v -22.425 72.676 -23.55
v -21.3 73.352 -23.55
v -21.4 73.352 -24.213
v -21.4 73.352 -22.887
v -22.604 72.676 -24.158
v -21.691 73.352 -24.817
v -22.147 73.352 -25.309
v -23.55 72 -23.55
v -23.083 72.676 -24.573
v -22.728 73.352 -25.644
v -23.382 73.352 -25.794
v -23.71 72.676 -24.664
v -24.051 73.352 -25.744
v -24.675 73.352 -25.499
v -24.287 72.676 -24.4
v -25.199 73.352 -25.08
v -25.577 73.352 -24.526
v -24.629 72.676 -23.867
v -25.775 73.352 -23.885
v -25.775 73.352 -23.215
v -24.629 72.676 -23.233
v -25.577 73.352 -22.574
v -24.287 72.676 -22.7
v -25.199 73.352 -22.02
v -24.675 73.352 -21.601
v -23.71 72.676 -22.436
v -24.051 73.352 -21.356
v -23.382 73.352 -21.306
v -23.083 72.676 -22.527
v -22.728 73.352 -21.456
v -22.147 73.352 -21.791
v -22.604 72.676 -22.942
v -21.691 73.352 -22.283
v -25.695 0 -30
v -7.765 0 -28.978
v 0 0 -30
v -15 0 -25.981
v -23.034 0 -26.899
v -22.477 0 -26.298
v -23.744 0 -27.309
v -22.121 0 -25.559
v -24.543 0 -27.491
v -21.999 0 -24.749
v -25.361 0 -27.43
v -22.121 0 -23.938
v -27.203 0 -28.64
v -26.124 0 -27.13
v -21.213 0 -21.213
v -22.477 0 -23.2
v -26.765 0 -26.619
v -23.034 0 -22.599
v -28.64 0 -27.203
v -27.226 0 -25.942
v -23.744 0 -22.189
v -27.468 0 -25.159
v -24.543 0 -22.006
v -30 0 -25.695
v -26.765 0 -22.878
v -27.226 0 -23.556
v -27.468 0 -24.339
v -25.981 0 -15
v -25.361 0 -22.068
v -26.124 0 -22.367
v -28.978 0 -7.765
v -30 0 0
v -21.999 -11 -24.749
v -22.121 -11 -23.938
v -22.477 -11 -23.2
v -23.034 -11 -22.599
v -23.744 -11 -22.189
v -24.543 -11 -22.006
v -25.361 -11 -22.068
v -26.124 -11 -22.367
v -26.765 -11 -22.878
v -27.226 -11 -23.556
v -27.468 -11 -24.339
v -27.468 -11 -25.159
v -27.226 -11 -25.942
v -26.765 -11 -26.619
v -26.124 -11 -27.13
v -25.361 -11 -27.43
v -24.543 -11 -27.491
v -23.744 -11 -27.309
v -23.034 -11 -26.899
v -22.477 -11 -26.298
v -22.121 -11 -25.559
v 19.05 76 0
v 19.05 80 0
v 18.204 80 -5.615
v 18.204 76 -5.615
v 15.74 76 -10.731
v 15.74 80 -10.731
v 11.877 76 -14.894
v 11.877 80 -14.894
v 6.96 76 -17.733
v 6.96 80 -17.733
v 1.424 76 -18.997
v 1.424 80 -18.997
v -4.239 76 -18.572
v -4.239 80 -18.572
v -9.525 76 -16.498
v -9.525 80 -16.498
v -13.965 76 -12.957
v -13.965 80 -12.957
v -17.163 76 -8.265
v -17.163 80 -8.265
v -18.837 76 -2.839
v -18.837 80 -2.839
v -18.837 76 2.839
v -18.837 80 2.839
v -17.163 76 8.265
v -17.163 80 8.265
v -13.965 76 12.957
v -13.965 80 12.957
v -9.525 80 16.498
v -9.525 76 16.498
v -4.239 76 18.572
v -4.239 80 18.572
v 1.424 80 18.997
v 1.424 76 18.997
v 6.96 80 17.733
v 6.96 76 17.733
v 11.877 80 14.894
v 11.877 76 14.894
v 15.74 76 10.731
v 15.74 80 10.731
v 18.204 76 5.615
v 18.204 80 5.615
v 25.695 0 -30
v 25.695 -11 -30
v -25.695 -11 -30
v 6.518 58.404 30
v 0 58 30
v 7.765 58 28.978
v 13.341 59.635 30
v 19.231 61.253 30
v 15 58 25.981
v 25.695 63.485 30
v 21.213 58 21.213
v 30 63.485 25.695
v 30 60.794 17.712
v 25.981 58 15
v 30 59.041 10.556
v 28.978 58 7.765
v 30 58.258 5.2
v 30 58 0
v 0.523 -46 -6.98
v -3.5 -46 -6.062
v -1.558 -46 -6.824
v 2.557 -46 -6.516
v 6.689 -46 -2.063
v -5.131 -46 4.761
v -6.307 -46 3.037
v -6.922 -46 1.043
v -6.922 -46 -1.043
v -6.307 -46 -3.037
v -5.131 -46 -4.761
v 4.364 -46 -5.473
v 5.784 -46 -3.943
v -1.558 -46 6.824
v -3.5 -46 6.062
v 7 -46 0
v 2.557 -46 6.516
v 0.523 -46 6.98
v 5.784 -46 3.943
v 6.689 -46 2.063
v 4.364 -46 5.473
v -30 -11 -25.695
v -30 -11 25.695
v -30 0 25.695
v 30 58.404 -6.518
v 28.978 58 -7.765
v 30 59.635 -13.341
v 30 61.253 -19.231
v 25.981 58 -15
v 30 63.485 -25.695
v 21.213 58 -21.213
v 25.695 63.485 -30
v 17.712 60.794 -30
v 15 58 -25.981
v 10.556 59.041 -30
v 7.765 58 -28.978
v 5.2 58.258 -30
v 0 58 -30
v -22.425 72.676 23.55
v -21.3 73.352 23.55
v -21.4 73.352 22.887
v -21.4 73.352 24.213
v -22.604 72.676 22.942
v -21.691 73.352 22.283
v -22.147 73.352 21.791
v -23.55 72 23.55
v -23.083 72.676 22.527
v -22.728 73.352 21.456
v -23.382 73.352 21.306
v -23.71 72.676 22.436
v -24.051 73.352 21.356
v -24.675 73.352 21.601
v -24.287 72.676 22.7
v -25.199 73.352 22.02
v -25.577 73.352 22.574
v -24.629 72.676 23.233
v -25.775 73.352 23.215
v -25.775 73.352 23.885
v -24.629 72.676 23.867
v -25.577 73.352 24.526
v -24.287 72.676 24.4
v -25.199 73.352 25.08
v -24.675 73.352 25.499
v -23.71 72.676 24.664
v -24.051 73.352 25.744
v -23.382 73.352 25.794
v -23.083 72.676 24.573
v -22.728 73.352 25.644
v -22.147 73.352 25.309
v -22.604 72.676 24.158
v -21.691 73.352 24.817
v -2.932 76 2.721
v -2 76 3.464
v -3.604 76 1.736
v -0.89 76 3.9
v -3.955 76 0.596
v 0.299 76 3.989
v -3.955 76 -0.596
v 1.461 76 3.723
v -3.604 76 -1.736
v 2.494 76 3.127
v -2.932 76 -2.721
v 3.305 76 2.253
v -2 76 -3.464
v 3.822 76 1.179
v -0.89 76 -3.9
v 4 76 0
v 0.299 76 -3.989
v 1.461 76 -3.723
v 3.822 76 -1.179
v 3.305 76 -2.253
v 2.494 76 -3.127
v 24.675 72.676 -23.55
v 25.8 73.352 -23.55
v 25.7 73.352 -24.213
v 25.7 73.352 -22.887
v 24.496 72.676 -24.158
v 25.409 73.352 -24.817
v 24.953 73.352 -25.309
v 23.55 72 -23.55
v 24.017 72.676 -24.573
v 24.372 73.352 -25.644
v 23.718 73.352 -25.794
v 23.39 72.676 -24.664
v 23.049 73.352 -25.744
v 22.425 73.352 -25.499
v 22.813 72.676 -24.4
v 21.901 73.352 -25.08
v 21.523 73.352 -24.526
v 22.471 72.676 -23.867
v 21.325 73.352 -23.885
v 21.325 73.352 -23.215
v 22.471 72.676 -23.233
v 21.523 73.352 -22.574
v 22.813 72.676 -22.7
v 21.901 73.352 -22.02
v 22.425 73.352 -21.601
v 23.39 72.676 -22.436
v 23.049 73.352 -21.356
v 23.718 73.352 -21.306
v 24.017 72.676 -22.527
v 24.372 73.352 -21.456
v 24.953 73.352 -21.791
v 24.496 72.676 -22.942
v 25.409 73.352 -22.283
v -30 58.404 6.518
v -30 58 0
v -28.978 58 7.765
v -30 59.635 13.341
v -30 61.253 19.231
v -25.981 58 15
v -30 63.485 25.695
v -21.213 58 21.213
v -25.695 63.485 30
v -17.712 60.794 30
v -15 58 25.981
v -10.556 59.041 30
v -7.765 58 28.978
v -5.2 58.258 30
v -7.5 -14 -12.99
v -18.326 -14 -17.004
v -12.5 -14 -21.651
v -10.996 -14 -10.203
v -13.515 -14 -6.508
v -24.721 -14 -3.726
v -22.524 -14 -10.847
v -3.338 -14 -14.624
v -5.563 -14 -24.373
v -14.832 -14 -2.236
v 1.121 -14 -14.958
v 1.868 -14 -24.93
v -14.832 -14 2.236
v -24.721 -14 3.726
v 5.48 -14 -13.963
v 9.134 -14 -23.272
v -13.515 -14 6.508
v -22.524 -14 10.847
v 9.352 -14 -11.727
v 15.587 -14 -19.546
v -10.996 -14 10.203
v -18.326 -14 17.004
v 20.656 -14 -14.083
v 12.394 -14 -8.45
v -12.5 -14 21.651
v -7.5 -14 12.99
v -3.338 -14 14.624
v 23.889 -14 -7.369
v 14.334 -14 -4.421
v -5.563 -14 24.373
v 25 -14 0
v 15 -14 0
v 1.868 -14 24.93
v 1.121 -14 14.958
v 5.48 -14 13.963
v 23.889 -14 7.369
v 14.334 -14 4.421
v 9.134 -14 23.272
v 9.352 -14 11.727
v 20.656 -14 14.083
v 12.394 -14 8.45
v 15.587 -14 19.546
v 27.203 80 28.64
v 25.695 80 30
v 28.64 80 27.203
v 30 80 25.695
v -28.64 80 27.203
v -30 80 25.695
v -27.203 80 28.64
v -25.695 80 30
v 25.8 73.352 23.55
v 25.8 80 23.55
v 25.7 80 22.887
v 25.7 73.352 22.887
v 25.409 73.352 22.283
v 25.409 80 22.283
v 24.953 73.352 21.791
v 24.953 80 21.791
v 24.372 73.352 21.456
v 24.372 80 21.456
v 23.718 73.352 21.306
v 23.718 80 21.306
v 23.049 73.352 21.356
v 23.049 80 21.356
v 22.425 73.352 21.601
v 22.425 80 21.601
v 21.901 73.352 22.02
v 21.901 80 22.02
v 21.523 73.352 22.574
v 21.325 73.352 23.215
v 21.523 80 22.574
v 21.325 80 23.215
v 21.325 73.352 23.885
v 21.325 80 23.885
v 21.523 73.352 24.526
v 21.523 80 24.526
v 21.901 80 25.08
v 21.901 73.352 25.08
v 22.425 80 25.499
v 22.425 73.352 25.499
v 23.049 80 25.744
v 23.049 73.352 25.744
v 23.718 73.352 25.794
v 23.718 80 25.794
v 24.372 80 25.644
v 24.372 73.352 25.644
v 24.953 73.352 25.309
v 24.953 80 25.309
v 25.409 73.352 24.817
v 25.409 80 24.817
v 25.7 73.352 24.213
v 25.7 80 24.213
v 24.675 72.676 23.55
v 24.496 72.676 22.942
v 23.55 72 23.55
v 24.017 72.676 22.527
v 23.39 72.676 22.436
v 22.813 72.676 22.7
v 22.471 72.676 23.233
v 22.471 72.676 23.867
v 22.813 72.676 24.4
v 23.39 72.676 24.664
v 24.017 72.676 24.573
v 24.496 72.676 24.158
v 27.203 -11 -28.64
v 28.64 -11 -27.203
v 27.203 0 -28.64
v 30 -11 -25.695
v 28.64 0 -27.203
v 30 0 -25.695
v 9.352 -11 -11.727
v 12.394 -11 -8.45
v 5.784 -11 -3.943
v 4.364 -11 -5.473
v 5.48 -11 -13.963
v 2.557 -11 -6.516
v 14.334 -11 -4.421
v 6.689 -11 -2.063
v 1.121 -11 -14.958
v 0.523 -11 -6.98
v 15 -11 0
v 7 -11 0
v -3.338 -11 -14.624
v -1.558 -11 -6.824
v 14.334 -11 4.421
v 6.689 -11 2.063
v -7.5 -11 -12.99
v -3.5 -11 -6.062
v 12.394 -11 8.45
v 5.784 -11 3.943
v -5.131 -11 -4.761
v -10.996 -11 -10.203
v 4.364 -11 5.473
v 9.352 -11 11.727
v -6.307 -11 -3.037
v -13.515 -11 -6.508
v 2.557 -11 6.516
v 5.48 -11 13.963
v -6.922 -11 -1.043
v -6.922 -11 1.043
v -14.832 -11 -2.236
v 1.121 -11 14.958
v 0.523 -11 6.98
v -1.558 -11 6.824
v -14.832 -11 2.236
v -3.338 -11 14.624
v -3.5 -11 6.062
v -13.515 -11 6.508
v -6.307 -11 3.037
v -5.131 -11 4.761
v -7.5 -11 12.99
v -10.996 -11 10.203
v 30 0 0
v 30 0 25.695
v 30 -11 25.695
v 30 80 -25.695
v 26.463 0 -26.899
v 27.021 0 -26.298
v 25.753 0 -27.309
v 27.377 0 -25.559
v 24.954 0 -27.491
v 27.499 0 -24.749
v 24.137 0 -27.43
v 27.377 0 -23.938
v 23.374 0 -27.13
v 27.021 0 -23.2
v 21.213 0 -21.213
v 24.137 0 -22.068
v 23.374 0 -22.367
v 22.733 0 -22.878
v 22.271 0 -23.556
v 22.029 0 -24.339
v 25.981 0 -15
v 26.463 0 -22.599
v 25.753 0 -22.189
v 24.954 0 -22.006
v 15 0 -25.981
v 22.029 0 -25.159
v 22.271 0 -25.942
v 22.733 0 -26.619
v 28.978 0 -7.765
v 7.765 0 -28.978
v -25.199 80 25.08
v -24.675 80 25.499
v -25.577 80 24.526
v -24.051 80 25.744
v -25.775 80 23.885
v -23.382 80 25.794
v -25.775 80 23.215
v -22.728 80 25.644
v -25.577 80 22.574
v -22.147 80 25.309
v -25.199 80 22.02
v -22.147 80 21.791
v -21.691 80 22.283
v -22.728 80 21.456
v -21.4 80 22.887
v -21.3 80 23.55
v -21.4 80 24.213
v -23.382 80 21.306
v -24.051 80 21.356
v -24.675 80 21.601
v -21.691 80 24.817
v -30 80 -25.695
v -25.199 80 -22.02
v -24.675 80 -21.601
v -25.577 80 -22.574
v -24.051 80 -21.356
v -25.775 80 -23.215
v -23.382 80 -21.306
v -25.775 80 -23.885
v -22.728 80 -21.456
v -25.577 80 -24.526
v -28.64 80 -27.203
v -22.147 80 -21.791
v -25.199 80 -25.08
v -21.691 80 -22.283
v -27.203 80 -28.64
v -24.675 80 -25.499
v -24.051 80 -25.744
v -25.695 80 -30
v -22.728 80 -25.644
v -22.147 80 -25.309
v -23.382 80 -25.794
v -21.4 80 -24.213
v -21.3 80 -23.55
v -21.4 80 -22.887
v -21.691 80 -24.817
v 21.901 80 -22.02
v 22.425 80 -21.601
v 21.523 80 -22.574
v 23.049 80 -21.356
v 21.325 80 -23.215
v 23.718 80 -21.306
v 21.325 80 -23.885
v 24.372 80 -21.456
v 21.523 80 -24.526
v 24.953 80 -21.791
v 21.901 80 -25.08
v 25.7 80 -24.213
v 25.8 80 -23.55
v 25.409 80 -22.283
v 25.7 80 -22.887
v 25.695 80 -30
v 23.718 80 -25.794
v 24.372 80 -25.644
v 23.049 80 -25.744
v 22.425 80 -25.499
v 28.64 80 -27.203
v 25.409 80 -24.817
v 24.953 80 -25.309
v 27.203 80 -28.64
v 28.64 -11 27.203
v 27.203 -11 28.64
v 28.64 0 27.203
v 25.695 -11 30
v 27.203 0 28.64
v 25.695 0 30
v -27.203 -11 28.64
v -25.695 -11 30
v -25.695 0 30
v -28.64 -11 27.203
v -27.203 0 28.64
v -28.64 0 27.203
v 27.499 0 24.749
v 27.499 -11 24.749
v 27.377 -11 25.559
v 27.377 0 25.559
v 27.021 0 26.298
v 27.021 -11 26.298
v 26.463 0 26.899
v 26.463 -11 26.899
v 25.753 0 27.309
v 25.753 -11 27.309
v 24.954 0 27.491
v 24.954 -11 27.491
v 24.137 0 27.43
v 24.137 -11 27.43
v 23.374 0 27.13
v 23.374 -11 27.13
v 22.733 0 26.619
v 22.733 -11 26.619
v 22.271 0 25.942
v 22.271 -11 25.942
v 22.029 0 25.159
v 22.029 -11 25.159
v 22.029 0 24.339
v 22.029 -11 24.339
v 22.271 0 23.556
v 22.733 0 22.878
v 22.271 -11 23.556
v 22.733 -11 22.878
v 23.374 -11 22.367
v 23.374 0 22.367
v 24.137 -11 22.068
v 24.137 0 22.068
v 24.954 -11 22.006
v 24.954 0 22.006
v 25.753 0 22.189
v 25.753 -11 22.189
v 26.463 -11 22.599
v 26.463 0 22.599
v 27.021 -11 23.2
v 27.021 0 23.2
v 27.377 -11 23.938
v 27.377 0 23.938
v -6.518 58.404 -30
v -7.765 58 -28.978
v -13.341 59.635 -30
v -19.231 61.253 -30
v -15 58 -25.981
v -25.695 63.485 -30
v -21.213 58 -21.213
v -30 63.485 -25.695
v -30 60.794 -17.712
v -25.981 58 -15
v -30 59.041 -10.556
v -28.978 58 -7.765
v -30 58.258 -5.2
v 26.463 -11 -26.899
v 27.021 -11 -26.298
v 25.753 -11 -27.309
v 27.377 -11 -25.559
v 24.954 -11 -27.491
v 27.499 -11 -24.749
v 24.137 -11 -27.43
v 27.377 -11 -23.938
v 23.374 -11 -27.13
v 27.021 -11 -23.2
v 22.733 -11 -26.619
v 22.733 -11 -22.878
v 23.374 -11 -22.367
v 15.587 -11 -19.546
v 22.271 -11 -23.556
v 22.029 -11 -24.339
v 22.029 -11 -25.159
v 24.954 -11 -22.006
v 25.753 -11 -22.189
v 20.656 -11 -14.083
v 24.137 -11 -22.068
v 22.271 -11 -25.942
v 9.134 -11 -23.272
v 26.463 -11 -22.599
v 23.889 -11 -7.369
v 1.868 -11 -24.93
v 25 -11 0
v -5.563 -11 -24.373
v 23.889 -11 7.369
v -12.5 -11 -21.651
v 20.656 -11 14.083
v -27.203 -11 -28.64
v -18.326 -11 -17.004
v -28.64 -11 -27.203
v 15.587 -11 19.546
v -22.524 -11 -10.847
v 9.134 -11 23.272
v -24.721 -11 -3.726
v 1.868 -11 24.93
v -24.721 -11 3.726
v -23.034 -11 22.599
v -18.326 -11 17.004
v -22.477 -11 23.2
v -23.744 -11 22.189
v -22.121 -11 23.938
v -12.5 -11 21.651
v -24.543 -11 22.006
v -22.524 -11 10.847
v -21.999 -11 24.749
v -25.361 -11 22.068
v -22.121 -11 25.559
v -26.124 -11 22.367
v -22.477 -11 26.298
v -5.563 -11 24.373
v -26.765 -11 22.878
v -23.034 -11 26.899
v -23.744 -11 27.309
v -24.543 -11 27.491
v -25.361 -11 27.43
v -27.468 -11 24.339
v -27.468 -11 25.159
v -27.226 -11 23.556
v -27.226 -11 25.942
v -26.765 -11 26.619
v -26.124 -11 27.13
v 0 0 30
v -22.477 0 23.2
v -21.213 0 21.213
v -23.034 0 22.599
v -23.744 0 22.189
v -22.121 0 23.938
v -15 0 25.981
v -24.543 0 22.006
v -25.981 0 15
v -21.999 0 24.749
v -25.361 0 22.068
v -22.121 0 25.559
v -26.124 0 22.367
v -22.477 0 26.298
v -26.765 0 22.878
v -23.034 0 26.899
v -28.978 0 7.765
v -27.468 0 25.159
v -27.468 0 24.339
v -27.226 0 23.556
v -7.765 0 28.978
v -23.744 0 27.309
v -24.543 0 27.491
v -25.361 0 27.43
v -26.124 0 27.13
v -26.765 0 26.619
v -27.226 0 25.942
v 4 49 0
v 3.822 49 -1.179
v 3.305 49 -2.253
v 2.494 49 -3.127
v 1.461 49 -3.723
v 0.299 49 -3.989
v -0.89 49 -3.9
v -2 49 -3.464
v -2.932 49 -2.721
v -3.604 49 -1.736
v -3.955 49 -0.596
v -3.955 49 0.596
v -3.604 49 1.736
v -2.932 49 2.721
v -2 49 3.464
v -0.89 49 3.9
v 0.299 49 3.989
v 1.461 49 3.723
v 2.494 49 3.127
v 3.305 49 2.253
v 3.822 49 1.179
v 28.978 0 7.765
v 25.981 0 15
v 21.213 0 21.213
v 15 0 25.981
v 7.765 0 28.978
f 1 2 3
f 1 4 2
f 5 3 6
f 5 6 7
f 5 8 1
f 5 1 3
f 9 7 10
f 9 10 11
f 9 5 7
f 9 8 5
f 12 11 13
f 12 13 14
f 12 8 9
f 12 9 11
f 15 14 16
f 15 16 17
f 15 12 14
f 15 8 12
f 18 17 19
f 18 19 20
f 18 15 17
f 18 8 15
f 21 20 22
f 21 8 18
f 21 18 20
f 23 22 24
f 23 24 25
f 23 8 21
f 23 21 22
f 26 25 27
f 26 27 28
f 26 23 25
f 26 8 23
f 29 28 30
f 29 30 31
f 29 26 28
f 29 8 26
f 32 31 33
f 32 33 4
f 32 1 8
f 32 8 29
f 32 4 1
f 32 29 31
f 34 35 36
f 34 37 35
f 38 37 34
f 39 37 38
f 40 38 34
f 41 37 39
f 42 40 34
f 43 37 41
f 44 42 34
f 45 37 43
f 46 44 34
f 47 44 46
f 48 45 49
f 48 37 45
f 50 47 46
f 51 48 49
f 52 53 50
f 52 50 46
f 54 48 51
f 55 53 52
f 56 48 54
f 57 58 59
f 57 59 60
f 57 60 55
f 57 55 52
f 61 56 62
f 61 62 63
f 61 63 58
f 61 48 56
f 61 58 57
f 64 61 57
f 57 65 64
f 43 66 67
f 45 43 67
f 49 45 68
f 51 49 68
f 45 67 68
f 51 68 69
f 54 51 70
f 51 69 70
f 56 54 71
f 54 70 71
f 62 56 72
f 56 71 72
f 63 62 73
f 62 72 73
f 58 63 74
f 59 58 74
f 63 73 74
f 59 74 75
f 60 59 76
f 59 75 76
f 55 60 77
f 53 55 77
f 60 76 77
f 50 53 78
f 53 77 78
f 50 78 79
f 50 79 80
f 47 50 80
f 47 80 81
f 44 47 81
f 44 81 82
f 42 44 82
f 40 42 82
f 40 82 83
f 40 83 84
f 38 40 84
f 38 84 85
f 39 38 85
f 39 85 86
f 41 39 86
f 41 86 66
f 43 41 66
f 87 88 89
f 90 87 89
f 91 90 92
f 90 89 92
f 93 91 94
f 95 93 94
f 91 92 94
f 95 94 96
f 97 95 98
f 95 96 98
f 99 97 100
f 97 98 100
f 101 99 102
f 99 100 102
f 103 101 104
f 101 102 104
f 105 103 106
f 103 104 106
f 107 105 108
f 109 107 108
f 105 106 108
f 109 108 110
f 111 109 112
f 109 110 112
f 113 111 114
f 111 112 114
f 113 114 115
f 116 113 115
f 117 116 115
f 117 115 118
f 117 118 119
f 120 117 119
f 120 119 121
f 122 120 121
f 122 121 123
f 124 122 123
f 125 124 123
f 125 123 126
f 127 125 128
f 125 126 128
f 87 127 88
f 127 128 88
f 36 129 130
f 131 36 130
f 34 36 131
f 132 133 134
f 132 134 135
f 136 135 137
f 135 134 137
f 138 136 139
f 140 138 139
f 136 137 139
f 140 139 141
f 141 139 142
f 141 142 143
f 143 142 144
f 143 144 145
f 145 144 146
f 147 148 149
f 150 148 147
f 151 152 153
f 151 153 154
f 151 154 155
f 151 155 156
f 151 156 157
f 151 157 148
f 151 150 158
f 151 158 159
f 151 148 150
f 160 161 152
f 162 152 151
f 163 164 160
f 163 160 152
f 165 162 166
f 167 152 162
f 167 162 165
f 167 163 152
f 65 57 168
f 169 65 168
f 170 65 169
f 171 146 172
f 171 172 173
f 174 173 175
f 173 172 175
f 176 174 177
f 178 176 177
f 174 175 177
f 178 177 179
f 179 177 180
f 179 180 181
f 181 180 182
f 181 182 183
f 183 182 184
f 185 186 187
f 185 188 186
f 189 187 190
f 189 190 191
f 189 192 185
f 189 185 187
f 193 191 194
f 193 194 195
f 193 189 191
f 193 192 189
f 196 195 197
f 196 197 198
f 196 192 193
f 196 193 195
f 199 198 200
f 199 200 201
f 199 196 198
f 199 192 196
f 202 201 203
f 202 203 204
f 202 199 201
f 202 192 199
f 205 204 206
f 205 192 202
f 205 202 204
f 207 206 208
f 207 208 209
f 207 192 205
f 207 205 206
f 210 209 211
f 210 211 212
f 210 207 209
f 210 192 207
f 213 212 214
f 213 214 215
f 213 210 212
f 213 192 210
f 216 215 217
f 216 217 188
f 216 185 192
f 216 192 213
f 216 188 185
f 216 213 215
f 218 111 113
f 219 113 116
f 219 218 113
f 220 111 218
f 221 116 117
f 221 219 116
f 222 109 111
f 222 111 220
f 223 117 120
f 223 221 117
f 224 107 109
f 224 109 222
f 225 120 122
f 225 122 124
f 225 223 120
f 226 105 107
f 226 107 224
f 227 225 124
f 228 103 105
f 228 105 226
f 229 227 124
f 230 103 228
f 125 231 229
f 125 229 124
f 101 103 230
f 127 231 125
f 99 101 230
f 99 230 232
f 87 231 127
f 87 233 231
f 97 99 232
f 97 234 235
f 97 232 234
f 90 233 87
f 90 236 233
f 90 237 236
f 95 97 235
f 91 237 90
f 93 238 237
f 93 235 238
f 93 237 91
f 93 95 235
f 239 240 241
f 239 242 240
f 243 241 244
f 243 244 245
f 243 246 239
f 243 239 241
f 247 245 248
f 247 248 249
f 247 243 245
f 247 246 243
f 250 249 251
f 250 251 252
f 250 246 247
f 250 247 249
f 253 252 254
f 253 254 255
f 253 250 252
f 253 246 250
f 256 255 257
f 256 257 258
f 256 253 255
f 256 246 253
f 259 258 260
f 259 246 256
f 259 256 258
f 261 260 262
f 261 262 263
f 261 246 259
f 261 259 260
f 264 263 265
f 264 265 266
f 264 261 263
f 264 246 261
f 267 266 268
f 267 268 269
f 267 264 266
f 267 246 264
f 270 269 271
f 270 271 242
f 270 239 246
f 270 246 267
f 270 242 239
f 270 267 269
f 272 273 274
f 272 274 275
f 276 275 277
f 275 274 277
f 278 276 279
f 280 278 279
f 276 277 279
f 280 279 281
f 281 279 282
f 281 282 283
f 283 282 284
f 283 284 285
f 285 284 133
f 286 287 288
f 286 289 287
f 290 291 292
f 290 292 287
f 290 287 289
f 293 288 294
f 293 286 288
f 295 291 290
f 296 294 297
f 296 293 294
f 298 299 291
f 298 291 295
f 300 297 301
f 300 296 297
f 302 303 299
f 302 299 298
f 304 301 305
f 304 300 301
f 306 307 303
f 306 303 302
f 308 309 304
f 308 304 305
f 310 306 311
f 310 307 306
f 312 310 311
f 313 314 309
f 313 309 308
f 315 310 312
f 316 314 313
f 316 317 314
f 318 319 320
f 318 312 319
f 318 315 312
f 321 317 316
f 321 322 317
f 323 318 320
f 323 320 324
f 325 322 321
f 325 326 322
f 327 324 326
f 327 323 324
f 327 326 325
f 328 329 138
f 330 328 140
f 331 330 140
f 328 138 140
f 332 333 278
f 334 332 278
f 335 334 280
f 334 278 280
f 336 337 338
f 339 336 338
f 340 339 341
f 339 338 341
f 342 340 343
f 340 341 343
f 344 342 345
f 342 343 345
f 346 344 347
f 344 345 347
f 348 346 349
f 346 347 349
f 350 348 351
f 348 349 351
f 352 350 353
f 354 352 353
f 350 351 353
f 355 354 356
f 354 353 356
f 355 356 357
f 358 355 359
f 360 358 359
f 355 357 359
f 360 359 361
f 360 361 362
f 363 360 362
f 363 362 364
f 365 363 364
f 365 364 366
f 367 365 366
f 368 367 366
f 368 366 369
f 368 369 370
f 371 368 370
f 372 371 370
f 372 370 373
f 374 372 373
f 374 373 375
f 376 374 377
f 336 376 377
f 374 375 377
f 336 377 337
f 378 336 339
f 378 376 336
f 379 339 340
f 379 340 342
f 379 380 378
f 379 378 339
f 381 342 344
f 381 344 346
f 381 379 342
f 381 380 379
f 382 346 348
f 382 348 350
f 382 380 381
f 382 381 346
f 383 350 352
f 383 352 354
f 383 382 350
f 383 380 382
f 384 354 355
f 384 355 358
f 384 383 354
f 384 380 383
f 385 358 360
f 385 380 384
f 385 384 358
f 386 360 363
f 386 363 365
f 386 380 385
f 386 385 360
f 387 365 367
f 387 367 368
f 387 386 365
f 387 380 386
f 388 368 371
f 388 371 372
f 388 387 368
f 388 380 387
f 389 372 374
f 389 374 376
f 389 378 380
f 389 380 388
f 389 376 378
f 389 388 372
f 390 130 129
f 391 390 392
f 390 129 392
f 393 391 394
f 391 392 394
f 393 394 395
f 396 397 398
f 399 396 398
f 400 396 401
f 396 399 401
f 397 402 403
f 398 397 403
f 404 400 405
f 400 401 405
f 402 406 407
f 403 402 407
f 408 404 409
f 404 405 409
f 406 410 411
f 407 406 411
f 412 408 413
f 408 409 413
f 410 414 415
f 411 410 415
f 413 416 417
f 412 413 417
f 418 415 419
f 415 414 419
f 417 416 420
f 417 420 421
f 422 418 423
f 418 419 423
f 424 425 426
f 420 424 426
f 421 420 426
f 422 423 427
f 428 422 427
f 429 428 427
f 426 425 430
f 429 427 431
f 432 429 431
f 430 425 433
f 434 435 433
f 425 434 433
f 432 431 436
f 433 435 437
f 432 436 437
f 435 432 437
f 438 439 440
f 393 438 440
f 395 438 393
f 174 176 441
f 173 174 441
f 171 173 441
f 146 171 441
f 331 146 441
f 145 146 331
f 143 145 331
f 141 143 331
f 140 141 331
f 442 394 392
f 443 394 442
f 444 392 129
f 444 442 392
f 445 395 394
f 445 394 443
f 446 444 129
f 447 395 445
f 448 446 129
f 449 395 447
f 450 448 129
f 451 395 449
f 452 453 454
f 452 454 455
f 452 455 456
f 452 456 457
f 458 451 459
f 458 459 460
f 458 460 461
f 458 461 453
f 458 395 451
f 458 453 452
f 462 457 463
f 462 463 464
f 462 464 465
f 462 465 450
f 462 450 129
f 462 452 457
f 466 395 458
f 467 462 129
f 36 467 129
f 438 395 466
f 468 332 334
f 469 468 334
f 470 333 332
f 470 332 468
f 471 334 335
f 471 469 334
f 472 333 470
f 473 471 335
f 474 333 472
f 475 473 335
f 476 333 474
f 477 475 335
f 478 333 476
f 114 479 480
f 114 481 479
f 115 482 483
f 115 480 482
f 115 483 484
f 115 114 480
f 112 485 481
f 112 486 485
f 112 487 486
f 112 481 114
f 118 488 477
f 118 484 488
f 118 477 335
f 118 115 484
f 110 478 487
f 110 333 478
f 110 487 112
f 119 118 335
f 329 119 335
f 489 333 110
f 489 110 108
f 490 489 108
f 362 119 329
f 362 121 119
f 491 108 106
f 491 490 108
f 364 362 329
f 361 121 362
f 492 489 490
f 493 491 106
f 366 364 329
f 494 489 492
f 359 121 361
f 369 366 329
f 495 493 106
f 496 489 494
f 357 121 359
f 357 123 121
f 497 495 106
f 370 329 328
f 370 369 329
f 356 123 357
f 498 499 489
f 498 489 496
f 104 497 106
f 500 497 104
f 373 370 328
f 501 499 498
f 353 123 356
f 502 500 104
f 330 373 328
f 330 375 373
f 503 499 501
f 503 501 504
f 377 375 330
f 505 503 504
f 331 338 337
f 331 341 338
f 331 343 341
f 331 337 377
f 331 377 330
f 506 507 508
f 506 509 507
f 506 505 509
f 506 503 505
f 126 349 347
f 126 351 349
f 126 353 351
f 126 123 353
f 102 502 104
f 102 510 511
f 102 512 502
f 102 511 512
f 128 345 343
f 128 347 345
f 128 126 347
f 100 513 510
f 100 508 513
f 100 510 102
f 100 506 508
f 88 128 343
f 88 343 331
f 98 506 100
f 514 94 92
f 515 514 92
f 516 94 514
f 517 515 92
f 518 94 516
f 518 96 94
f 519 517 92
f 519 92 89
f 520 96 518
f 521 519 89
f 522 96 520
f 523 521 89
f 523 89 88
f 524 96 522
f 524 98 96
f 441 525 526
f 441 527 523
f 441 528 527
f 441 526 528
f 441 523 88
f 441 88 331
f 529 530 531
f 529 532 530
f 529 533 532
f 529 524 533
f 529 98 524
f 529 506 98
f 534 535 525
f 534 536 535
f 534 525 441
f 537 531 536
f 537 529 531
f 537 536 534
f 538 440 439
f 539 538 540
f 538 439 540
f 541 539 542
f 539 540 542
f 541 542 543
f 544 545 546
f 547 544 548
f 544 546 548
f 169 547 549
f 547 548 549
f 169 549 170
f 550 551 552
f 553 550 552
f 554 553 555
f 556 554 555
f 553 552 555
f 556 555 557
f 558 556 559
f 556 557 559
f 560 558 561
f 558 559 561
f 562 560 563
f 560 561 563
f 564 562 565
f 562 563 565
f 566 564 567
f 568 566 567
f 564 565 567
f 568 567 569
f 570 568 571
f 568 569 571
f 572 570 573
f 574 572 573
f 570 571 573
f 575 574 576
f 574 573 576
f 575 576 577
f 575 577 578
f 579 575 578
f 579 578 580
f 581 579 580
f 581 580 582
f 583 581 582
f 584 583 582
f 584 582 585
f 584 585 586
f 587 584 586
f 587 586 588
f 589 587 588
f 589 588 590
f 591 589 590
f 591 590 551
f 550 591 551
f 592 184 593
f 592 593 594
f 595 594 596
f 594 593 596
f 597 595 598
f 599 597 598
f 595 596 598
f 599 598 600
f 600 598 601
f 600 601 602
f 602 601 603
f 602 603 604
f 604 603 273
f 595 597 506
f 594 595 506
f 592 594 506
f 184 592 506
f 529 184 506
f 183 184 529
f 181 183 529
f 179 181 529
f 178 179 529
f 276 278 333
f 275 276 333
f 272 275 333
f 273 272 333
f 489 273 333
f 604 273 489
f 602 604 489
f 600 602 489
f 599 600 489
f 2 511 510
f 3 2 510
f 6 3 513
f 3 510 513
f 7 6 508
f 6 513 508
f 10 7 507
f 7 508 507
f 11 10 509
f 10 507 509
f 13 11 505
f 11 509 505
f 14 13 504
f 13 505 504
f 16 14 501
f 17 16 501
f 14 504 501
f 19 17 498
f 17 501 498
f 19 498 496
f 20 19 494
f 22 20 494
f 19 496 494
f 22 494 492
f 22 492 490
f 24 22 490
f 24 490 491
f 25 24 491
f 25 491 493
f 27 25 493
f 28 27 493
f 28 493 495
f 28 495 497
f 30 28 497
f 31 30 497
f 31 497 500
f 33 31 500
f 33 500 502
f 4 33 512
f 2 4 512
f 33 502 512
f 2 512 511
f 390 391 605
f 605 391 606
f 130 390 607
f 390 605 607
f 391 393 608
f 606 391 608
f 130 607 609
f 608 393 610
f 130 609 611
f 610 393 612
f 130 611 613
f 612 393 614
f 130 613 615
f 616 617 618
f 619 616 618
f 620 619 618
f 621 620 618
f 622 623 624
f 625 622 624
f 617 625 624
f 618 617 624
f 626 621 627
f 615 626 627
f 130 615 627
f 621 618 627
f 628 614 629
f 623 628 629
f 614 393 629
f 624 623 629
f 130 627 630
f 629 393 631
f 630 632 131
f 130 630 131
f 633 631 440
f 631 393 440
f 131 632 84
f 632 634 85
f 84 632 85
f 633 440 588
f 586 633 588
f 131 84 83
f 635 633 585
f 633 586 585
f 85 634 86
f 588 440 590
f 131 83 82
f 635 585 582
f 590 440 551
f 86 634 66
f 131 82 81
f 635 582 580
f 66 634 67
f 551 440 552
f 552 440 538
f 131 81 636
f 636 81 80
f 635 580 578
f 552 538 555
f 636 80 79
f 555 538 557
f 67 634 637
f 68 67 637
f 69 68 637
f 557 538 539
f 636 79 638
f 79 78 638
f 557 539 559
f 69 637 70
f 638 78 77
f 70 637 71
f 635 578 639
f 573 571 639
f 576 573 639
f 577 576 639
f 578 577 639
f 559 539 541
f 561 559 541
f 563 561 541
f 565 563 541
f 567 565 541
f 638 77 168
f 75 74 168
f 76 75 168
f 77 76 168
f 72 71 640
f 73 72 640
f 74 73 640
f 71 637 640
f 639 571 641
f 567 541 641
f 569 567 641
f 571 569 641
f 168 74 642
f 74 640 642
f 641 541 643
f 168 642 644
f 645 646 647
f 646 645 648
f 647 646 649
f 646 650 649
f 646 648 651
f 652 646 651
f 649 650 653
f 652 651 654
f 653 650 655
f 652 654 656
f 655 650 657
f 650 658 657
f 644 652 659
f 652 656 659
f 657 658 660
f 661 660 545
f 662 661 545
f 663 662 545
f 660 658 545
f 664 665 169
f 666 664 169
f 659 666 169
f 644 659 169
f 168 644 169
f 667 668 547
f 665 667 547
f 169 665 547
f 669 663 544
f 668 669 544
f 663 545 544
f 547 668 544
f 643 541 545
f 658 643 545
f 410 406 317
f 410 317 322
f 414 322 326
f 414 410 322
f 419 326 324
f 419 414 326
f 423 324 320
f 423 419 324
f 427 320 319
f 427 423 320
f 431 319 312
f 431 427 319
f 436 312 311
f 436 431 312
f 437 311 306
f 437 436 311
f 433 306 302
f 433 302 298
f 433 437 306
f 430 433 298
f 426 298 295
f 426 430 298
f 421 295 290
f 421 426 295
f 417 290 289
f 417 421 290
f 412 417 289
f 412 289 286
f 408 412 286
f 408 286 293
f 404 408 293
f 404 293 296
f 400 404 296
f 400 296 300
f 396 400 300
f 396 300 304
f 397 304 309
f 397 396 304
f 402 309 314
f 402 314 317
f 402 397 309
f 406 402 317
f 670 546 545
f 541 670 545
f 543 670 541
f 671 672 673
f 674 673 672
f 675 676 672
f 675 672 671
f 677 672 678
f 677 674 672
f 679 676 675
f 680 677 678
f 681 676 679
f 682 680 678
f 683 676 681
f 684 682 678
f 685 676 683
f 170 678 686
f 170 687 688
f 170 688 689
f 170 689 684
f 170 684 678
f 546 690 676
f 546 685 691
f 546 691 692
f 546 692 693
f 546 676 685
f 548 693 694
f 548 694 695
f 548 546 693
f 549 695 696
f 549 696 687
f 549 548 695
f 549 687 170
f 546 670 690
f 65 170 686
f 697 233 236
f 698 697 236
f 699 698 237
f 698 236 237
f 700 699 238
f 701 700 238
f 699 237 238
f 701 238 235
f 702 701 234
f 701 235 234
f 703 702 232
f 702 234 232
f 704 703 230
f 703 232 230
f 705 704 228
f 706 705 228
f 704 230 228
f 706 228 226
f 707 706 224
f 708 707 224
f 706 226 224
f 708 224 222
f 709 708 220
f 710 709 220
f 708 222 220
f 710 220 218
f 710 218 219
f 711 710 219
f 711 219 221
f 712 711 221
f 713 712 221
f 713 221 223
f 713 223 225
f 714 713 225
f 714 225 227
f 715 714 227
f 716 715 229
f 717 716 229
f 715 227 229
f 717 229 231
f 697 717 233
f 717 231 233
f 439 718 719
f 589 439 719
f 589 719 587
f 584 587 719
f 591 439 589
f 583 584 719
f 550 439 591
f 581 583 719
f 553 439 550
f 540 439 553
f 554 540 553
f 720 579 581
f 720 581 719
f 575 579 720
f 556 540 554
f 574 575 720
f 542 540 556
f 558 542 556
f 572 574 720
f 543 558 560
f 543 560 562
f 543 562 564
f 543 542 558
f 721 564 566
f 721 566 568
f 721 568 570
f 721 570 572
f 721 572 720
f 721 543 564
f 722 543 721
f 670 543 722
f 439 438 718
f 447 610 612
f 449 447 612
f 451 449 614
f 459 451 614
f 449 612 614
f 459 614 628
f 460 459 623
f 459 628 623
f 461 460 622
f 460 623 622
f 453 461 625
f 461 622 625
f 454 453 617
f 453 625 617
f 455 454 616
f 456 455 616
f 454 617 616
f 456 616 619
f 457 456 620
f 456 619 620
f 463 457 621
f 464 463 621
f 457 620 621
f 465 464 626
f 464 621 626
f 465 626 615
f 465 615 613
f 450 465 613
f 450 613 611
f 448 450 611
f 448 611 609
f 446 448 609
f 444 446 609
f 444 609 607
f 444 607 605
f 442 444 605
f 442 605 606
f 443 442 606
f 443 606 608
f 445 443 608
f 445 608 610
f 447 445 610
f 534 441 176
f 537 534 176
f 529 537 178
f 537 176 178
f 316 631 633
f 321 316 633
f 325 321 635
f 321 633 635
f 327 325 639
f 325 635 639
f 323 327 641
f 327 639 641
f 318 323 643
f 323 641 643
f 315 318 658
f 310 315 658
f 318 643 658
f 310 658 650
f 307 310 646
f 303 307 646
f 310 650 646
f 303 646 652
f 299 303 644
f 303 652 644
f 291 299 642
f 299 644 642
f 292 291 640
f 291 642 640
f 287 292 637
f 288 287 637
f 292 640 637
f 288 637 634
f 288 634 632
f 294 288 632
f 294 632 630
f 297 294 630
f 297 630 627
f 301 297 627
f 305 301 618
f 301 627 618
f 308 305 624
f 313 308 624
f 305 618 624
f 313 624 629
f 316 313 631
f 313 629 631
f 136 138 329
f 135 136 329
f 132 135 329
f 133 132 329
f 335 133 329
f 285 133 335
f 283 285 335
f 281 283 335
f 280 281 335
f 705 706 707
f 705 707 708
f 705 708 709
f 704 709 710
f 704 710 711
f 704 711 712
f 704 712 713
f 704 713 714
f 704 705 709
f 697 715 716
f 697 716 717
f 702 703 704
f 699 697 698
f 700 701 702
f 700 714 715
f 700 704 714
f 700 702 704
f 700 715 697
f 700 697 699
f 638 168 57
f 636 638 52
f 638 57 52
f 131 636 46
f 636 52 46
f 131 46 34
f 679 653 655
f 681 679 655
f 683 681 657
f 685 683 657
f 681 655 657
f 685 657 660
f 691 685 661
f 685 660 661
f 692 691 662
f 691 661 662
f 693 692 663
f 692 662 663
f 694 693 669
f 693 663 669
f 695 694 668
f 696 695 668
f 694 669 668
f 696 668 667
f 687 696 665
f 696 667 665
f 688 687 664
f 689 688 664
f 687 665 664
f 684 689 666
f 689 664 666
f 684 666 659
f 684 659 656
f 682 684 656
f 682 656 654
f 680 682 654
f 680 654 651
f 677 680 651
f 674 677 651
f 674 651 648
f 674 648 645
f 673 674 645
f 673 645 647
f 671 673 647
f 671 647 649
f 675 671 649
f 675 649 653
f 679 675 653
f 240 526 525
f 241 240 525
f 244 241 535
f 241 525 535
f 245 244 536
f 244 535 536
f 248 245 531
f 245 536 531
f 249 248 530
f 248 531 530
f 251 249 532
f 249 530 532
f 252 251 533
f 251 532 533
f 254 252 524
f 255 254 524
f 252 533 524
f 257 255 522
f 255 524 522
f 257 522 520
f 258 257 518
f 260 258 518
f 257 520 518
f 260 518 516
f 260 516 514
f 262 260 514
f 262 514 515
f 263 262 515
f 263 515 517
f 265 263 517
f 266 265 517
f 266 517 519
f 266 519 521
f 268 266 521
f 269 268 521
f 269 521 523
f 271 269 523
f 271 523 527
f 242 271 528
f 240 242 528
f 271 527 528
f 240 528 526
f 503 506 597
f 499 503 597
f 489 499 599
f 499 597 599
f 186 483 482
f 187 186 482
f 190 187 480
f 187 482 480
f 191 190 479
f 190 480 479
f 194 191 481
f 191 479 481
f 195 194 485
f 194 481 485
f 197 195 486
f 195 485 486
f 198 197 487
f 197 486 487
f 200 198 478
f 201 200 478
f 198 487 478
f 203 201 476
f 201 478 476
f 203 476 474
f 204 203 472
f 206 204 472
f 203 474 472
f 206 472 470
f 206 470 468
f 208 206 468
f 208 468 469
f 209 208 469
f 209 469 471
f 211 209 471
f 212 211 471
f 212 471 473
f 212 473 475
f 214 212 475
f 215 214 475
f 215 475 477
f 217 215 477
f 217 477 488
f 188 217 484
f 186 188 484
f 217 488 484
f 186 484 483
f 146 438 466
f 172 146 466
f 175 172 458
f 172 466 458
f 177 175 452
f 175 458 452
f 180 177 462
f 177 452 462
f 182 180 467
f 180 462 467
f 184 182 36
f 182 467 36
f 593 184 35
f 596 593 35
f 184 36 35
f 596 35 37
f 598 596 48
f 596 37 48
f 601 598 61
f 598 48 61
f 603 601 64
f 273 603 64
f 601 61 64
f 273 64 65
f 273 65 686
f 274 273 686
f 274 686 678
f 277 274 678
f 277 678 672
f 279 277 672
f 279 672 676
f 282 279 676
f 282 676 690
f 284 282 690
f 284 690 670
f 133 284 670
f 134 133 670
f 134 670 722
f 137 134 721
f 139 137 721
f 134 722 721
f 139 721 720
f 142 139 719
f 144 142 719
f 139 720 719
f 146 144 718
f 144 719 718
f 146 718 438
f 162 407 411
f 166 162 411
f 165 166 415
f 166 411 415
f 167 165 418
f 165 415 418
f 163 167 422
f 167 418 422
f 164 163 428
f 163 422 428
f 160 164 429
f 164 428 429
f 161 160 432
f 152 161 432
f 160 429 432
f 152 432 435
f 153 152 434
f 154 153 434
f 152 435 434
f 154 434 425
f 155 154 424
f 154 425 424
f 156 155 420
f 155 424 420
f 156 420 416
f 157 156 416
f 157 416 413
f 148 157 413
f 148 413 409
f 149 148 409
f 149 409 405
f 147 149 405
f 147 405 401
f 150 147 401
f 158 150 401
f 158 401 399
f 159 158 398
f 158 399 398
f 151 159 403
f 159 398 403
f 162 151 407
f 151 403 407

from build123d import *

# Parameters (mm, degrees)
PAD_DEPTH       = 11
SKETCH001_R     = 25
SKETCH001_R_2   = 15
PAD001_DEPTH    = 3
SKETCH002_R     = 7
PAD002_DEPTH    = 35
SKETCH003_R     = 30
PAD003_DEPTH    = 58
PAD004_DEPTH    = 22
SKETCH006_R     = 19.05
POCKET_DEPTH    = 4
SKETCH007_R     = 2.25
HOLE_DEPTH      = 6.648064
HOLE_TIPS_R     = 2.25
SKETCH008_R     = 4
POCKET001_DEPTH = 27
SKETCH009_R     = 2.75
HOLE001_DEPTH   = 23.347633
HOLE001_TIPS_R  = 2.75


with BuildPart() as part:
    # Sketch → Pad (new body)
    with BuildSketch(Plane.XZ):
        with BuildLine():
            Line((-25.69533, 30), (25.69533, 30))
            ThreePointArc((30, 25.69533), (27.930718, 27.930718), (25.69533, 30))
            Line((30, 25.69533), (30, -25.69533))
            ThreePointArc((25.69533, -30), (27.930718, -27.930718), (30, -25.69533))
            Line((25.69533, -30), (-25.69533, -30))
            ThreePointArc((-30, -25.69533), (-27.930718, -27.930718), (-25.69533, -30))
            Line((-30, -25.69533), (-30, 25.69533))
            ThreePointArc((-25.69533, 30), (-27.930718, 27.930718), (-30, 25.69533))
        make_face()
    extrude(amount=PAD_DEPTH)

    # Sketch001 (on Face10 of Pad) → Pad001 (join)
    with BuildSketch(Plane.XZ.offset(11)):
        Circle(SKETCH001_R)
        Circle(SKETCH001_R_2, mode=Mode.SUBTRACT)
    extrude(amount=PAD001_DEPTH)

    # Sketch002 (on Face14 of Pad001) → Pad002 (join)
    with BuildSketch(Plane.XZ.offset(11)):
        Circle(SKETCH002_R)
    extrude(amount=PAD002_DEPTH)

    # Sketch003 (on Face4 of Pad002) → Pad003 (join)
    with BuildSketch(Plane(origin=(0, 0, 0), x_dir=(1, 0, 0), z_dir=(0, 1, 0))):
        Circle(SKETCH003_R)
    extrude(amount=PAD003_DEPTH)

    # Sketch004 (on Face16 of Pad003) → Pad004 (join)
    with BuildSketch(Plane(origin=(0, 58, 0), x_dir=(1, 0, 0), z_dir=(0, 1, 0))):
        with BuildLine():
            ThreePointArc((-30, -25.69533), (-27.930718, -27.930718), (-25.69533, -30))
            Line((25.69533, -30), (-25.69533, -30))
            ThreePointArc((25.69533, -30), (27.930718, -27.930718), (30, -25.69533))
            Line((30, 25.69533), (30, -25.69533))
            ThreePointArc((30, 25.69533), (27.930718, 27.930718), (25.69533, 30))
            Line((-25.69533, 30), (25.69533, 30))
            ThreePointArc((-25.69533, 30), (-27.930718, 27.930718), (-30, 25.69533))
            Line((-30, -25.69533), (-30, 25.69533))
        make_face()
    extrude(amount=PAD004_DEPTH)

    # Sketch005 → Groove (revolve, cut)
    with BuildSketch(Plane.YZ):
        Polygon((80, 68.105118), (58, 30), (58, 68.105118), align=None)
    revolve(axis=Axis((0, 0, 0), (0, 1, 0)), mode=Mode.SUBTRACT)

    # Sketch006 (on Face30 of Groove) → Pocket (cut)
    with BuildSketch(Plane(origin=(0, 80, 0), x_dir=(1, 0, 0), z_dir=(0, 1, 0))):
        Circle(SKETCH006_R)
    extrude(amount=-POCKET_DEPTH, mode=Mode.SUBTRACT)

    # Sketch007 (on Face30 of Pocket) → Hole (cut)
    with BuildSketch(Plane(origin=(0, 80, 0), x_dir=(1, 0, 0), z_dir=(0, 1, 0))):
        with Locations((-23.55, -23.55)):
            Circle(SKETCH007_R)
        with Locations((23.55, -23.55)):
            Circle(SKETCH007_R)
        with Locations((-23.55, 23.55)):
            Circle(SKETCH007_R)
        with Locations((23.55, 23.55)):
            Circle(SKETCH007_R)
    extrude(amount=-HOLE_DEPTH, mode=Mode.SUBTRACT)

    # Hole tips → Hole tip 1 section 0
    with BuildSketch(Plane(origin=(0, 73.351936, 0), x_dir=(1, 0, 0), z_dir=(0, 1, 0)), mode=Mode.PRIVATE) as hole_tip_1_s0:
        with Locations((-23.55, -23.55)):
            Circle(HOLE_TIPS_R)
    loft([hole_tip_1_s0.sketch, Vertex(-23.55, 72, 23.55)], mode=Mode.SUBTRACT)

    # Hole tips → Hole tip 2 section 0
    with BuildSketch(Plane(origin=(0, 73.351936, 0), x_dir=(1, 0, 0), z_dir=(0, 1, 0)), mode=Mode.PRIVATE) as hole_tip_2_s0:
        with Locations((23.55, -23.55)):
            Circle(HOLE_TIPS_R)
    loft([hole_tip_2_s0.sketch, Vertex(23.55, 72, 23.55)], mode=Mode.SUBTRACT)

    # Hole tips → Hole tip 3 section 0
    with BuildSketch(Plane(origin=(0, 73.351936, 0), x_dir=(1, 0, 0), z_dir=(0, 1, 0)), mode=Mode.PRIVATE) as hole_tip_3_s0:
        with Locations((-23.55, 23.55)):
            Circle(HOLE_TIPS_R)
    loft([hole_tip_3_s0.sketch, Vertex(-23.55, 72, -23.55)], mode=Mode.SUBTRACT)

    # Hole tips → Hole tip 4 section 0
    with BuildSketch(Plane(origin=(0, 73.351936, 0), x_dir=(1, 0, 0), z_dir=(0, 1, 0)), mode=Mode.PRIVATE) as hole_tip_4_s0:
        with Locations((23.55, 23.55)):
            Circle(HOLE_TIPS_R)
    loft([hole_tip_4_s0.sketch, Vertex(23.55, 72, -23.55)], mode=Mode.SUBTRACT)

    # Sketch008 (on Face41 of Hole) → Pocket001 (cut)
    with BuildSketch(Plane(origin=(0, 76, 0), x_dir=(1, 0, 0), z_dir=(0, 1, 0))):
        Circle(SKETCH008_R)
    extrude(amount=-POCKET001_DEPTH, mode=Mode.SUBTRACT)

    # Sketch009 (on Face6 of Pocket001) → Hole001 (cut)
    with BuildSketch(Plane.XZ.offset(11)):
        with Locations((-24.748737, 24.748737)):
            Circle(SKETCH009_R)
        with Locations((24.748737, 24.748737)):
            Circle(SKETCH009_R)
        with Locations((24.748737, -24.748737)):
            Circle(SKETCH009_R)
        with Locations((-24.748737, -24.748737)):
            Circle(SKETCH009_R)
    extrude(amount=-HOLE001_DEPTH, mode=Mode.SUBTRACT)

    # Hole001 tips → Hole001 tip 1 section 0
    with BuildSketch(Plane.XZ.offset(-12.347633), mode=Mode.PRIVATE) as hole001_tip_1_s0:
        with Locations((-24.748737, 24.748737)):
            Circle(HOLE001_TIPS_R)
    loft([hole001_tip_1_s0.sketch, Vertex(-24.748737, 14, 24.748737)], mode=Mode.SUBTRACT)

    # Hole001 tips → Hole001 tip 2 section 0
    with BuildSketch(Plane.XZ.offset(-12.347633), mode=Mode.PRIVATE) as hole001_tip_2_s0:
        with Locations((24.748737, 24.748737)):
            Circle(HOLE001_TIPS_R)
    loft([hole001_tip_2_s0.sketch, Vertex(24.748737, 14, 24.748737)], mode=Mode.SUBTRACT)

    # Hole001 tips → Hole001 tip 3 section 0
    with BuildSketch(Plane.XZ.offset(-12.347633), mode=Mode.PRIVATE) as hole001_tip_3_s0:
        with Locations((24.748737, -24.748737)):
            Circle(HOLE001_TIPS_R)
    loft([hole001_tip_3_s0.sketch, Vertex(24.748737, 14, -24.748737)], mode=Mode.SUBTRACT)

    # Hole001 tips → Hole001 tip 4 section 0
    with BuildSketch(Plane.XZ.offset(-12.347633), mode=Mode.PRIVATE) as hole001_tip_4_s0:
        with Locations((-24.748737, -24.748737)):
            Circle(HOLE001_TIPS_R)
    loft([hole001_tip_4_s0.sketch, Vertex(-24.748737, 14, -24.748737)], mode=Mode.SUBTRACT)


solid = part.part
